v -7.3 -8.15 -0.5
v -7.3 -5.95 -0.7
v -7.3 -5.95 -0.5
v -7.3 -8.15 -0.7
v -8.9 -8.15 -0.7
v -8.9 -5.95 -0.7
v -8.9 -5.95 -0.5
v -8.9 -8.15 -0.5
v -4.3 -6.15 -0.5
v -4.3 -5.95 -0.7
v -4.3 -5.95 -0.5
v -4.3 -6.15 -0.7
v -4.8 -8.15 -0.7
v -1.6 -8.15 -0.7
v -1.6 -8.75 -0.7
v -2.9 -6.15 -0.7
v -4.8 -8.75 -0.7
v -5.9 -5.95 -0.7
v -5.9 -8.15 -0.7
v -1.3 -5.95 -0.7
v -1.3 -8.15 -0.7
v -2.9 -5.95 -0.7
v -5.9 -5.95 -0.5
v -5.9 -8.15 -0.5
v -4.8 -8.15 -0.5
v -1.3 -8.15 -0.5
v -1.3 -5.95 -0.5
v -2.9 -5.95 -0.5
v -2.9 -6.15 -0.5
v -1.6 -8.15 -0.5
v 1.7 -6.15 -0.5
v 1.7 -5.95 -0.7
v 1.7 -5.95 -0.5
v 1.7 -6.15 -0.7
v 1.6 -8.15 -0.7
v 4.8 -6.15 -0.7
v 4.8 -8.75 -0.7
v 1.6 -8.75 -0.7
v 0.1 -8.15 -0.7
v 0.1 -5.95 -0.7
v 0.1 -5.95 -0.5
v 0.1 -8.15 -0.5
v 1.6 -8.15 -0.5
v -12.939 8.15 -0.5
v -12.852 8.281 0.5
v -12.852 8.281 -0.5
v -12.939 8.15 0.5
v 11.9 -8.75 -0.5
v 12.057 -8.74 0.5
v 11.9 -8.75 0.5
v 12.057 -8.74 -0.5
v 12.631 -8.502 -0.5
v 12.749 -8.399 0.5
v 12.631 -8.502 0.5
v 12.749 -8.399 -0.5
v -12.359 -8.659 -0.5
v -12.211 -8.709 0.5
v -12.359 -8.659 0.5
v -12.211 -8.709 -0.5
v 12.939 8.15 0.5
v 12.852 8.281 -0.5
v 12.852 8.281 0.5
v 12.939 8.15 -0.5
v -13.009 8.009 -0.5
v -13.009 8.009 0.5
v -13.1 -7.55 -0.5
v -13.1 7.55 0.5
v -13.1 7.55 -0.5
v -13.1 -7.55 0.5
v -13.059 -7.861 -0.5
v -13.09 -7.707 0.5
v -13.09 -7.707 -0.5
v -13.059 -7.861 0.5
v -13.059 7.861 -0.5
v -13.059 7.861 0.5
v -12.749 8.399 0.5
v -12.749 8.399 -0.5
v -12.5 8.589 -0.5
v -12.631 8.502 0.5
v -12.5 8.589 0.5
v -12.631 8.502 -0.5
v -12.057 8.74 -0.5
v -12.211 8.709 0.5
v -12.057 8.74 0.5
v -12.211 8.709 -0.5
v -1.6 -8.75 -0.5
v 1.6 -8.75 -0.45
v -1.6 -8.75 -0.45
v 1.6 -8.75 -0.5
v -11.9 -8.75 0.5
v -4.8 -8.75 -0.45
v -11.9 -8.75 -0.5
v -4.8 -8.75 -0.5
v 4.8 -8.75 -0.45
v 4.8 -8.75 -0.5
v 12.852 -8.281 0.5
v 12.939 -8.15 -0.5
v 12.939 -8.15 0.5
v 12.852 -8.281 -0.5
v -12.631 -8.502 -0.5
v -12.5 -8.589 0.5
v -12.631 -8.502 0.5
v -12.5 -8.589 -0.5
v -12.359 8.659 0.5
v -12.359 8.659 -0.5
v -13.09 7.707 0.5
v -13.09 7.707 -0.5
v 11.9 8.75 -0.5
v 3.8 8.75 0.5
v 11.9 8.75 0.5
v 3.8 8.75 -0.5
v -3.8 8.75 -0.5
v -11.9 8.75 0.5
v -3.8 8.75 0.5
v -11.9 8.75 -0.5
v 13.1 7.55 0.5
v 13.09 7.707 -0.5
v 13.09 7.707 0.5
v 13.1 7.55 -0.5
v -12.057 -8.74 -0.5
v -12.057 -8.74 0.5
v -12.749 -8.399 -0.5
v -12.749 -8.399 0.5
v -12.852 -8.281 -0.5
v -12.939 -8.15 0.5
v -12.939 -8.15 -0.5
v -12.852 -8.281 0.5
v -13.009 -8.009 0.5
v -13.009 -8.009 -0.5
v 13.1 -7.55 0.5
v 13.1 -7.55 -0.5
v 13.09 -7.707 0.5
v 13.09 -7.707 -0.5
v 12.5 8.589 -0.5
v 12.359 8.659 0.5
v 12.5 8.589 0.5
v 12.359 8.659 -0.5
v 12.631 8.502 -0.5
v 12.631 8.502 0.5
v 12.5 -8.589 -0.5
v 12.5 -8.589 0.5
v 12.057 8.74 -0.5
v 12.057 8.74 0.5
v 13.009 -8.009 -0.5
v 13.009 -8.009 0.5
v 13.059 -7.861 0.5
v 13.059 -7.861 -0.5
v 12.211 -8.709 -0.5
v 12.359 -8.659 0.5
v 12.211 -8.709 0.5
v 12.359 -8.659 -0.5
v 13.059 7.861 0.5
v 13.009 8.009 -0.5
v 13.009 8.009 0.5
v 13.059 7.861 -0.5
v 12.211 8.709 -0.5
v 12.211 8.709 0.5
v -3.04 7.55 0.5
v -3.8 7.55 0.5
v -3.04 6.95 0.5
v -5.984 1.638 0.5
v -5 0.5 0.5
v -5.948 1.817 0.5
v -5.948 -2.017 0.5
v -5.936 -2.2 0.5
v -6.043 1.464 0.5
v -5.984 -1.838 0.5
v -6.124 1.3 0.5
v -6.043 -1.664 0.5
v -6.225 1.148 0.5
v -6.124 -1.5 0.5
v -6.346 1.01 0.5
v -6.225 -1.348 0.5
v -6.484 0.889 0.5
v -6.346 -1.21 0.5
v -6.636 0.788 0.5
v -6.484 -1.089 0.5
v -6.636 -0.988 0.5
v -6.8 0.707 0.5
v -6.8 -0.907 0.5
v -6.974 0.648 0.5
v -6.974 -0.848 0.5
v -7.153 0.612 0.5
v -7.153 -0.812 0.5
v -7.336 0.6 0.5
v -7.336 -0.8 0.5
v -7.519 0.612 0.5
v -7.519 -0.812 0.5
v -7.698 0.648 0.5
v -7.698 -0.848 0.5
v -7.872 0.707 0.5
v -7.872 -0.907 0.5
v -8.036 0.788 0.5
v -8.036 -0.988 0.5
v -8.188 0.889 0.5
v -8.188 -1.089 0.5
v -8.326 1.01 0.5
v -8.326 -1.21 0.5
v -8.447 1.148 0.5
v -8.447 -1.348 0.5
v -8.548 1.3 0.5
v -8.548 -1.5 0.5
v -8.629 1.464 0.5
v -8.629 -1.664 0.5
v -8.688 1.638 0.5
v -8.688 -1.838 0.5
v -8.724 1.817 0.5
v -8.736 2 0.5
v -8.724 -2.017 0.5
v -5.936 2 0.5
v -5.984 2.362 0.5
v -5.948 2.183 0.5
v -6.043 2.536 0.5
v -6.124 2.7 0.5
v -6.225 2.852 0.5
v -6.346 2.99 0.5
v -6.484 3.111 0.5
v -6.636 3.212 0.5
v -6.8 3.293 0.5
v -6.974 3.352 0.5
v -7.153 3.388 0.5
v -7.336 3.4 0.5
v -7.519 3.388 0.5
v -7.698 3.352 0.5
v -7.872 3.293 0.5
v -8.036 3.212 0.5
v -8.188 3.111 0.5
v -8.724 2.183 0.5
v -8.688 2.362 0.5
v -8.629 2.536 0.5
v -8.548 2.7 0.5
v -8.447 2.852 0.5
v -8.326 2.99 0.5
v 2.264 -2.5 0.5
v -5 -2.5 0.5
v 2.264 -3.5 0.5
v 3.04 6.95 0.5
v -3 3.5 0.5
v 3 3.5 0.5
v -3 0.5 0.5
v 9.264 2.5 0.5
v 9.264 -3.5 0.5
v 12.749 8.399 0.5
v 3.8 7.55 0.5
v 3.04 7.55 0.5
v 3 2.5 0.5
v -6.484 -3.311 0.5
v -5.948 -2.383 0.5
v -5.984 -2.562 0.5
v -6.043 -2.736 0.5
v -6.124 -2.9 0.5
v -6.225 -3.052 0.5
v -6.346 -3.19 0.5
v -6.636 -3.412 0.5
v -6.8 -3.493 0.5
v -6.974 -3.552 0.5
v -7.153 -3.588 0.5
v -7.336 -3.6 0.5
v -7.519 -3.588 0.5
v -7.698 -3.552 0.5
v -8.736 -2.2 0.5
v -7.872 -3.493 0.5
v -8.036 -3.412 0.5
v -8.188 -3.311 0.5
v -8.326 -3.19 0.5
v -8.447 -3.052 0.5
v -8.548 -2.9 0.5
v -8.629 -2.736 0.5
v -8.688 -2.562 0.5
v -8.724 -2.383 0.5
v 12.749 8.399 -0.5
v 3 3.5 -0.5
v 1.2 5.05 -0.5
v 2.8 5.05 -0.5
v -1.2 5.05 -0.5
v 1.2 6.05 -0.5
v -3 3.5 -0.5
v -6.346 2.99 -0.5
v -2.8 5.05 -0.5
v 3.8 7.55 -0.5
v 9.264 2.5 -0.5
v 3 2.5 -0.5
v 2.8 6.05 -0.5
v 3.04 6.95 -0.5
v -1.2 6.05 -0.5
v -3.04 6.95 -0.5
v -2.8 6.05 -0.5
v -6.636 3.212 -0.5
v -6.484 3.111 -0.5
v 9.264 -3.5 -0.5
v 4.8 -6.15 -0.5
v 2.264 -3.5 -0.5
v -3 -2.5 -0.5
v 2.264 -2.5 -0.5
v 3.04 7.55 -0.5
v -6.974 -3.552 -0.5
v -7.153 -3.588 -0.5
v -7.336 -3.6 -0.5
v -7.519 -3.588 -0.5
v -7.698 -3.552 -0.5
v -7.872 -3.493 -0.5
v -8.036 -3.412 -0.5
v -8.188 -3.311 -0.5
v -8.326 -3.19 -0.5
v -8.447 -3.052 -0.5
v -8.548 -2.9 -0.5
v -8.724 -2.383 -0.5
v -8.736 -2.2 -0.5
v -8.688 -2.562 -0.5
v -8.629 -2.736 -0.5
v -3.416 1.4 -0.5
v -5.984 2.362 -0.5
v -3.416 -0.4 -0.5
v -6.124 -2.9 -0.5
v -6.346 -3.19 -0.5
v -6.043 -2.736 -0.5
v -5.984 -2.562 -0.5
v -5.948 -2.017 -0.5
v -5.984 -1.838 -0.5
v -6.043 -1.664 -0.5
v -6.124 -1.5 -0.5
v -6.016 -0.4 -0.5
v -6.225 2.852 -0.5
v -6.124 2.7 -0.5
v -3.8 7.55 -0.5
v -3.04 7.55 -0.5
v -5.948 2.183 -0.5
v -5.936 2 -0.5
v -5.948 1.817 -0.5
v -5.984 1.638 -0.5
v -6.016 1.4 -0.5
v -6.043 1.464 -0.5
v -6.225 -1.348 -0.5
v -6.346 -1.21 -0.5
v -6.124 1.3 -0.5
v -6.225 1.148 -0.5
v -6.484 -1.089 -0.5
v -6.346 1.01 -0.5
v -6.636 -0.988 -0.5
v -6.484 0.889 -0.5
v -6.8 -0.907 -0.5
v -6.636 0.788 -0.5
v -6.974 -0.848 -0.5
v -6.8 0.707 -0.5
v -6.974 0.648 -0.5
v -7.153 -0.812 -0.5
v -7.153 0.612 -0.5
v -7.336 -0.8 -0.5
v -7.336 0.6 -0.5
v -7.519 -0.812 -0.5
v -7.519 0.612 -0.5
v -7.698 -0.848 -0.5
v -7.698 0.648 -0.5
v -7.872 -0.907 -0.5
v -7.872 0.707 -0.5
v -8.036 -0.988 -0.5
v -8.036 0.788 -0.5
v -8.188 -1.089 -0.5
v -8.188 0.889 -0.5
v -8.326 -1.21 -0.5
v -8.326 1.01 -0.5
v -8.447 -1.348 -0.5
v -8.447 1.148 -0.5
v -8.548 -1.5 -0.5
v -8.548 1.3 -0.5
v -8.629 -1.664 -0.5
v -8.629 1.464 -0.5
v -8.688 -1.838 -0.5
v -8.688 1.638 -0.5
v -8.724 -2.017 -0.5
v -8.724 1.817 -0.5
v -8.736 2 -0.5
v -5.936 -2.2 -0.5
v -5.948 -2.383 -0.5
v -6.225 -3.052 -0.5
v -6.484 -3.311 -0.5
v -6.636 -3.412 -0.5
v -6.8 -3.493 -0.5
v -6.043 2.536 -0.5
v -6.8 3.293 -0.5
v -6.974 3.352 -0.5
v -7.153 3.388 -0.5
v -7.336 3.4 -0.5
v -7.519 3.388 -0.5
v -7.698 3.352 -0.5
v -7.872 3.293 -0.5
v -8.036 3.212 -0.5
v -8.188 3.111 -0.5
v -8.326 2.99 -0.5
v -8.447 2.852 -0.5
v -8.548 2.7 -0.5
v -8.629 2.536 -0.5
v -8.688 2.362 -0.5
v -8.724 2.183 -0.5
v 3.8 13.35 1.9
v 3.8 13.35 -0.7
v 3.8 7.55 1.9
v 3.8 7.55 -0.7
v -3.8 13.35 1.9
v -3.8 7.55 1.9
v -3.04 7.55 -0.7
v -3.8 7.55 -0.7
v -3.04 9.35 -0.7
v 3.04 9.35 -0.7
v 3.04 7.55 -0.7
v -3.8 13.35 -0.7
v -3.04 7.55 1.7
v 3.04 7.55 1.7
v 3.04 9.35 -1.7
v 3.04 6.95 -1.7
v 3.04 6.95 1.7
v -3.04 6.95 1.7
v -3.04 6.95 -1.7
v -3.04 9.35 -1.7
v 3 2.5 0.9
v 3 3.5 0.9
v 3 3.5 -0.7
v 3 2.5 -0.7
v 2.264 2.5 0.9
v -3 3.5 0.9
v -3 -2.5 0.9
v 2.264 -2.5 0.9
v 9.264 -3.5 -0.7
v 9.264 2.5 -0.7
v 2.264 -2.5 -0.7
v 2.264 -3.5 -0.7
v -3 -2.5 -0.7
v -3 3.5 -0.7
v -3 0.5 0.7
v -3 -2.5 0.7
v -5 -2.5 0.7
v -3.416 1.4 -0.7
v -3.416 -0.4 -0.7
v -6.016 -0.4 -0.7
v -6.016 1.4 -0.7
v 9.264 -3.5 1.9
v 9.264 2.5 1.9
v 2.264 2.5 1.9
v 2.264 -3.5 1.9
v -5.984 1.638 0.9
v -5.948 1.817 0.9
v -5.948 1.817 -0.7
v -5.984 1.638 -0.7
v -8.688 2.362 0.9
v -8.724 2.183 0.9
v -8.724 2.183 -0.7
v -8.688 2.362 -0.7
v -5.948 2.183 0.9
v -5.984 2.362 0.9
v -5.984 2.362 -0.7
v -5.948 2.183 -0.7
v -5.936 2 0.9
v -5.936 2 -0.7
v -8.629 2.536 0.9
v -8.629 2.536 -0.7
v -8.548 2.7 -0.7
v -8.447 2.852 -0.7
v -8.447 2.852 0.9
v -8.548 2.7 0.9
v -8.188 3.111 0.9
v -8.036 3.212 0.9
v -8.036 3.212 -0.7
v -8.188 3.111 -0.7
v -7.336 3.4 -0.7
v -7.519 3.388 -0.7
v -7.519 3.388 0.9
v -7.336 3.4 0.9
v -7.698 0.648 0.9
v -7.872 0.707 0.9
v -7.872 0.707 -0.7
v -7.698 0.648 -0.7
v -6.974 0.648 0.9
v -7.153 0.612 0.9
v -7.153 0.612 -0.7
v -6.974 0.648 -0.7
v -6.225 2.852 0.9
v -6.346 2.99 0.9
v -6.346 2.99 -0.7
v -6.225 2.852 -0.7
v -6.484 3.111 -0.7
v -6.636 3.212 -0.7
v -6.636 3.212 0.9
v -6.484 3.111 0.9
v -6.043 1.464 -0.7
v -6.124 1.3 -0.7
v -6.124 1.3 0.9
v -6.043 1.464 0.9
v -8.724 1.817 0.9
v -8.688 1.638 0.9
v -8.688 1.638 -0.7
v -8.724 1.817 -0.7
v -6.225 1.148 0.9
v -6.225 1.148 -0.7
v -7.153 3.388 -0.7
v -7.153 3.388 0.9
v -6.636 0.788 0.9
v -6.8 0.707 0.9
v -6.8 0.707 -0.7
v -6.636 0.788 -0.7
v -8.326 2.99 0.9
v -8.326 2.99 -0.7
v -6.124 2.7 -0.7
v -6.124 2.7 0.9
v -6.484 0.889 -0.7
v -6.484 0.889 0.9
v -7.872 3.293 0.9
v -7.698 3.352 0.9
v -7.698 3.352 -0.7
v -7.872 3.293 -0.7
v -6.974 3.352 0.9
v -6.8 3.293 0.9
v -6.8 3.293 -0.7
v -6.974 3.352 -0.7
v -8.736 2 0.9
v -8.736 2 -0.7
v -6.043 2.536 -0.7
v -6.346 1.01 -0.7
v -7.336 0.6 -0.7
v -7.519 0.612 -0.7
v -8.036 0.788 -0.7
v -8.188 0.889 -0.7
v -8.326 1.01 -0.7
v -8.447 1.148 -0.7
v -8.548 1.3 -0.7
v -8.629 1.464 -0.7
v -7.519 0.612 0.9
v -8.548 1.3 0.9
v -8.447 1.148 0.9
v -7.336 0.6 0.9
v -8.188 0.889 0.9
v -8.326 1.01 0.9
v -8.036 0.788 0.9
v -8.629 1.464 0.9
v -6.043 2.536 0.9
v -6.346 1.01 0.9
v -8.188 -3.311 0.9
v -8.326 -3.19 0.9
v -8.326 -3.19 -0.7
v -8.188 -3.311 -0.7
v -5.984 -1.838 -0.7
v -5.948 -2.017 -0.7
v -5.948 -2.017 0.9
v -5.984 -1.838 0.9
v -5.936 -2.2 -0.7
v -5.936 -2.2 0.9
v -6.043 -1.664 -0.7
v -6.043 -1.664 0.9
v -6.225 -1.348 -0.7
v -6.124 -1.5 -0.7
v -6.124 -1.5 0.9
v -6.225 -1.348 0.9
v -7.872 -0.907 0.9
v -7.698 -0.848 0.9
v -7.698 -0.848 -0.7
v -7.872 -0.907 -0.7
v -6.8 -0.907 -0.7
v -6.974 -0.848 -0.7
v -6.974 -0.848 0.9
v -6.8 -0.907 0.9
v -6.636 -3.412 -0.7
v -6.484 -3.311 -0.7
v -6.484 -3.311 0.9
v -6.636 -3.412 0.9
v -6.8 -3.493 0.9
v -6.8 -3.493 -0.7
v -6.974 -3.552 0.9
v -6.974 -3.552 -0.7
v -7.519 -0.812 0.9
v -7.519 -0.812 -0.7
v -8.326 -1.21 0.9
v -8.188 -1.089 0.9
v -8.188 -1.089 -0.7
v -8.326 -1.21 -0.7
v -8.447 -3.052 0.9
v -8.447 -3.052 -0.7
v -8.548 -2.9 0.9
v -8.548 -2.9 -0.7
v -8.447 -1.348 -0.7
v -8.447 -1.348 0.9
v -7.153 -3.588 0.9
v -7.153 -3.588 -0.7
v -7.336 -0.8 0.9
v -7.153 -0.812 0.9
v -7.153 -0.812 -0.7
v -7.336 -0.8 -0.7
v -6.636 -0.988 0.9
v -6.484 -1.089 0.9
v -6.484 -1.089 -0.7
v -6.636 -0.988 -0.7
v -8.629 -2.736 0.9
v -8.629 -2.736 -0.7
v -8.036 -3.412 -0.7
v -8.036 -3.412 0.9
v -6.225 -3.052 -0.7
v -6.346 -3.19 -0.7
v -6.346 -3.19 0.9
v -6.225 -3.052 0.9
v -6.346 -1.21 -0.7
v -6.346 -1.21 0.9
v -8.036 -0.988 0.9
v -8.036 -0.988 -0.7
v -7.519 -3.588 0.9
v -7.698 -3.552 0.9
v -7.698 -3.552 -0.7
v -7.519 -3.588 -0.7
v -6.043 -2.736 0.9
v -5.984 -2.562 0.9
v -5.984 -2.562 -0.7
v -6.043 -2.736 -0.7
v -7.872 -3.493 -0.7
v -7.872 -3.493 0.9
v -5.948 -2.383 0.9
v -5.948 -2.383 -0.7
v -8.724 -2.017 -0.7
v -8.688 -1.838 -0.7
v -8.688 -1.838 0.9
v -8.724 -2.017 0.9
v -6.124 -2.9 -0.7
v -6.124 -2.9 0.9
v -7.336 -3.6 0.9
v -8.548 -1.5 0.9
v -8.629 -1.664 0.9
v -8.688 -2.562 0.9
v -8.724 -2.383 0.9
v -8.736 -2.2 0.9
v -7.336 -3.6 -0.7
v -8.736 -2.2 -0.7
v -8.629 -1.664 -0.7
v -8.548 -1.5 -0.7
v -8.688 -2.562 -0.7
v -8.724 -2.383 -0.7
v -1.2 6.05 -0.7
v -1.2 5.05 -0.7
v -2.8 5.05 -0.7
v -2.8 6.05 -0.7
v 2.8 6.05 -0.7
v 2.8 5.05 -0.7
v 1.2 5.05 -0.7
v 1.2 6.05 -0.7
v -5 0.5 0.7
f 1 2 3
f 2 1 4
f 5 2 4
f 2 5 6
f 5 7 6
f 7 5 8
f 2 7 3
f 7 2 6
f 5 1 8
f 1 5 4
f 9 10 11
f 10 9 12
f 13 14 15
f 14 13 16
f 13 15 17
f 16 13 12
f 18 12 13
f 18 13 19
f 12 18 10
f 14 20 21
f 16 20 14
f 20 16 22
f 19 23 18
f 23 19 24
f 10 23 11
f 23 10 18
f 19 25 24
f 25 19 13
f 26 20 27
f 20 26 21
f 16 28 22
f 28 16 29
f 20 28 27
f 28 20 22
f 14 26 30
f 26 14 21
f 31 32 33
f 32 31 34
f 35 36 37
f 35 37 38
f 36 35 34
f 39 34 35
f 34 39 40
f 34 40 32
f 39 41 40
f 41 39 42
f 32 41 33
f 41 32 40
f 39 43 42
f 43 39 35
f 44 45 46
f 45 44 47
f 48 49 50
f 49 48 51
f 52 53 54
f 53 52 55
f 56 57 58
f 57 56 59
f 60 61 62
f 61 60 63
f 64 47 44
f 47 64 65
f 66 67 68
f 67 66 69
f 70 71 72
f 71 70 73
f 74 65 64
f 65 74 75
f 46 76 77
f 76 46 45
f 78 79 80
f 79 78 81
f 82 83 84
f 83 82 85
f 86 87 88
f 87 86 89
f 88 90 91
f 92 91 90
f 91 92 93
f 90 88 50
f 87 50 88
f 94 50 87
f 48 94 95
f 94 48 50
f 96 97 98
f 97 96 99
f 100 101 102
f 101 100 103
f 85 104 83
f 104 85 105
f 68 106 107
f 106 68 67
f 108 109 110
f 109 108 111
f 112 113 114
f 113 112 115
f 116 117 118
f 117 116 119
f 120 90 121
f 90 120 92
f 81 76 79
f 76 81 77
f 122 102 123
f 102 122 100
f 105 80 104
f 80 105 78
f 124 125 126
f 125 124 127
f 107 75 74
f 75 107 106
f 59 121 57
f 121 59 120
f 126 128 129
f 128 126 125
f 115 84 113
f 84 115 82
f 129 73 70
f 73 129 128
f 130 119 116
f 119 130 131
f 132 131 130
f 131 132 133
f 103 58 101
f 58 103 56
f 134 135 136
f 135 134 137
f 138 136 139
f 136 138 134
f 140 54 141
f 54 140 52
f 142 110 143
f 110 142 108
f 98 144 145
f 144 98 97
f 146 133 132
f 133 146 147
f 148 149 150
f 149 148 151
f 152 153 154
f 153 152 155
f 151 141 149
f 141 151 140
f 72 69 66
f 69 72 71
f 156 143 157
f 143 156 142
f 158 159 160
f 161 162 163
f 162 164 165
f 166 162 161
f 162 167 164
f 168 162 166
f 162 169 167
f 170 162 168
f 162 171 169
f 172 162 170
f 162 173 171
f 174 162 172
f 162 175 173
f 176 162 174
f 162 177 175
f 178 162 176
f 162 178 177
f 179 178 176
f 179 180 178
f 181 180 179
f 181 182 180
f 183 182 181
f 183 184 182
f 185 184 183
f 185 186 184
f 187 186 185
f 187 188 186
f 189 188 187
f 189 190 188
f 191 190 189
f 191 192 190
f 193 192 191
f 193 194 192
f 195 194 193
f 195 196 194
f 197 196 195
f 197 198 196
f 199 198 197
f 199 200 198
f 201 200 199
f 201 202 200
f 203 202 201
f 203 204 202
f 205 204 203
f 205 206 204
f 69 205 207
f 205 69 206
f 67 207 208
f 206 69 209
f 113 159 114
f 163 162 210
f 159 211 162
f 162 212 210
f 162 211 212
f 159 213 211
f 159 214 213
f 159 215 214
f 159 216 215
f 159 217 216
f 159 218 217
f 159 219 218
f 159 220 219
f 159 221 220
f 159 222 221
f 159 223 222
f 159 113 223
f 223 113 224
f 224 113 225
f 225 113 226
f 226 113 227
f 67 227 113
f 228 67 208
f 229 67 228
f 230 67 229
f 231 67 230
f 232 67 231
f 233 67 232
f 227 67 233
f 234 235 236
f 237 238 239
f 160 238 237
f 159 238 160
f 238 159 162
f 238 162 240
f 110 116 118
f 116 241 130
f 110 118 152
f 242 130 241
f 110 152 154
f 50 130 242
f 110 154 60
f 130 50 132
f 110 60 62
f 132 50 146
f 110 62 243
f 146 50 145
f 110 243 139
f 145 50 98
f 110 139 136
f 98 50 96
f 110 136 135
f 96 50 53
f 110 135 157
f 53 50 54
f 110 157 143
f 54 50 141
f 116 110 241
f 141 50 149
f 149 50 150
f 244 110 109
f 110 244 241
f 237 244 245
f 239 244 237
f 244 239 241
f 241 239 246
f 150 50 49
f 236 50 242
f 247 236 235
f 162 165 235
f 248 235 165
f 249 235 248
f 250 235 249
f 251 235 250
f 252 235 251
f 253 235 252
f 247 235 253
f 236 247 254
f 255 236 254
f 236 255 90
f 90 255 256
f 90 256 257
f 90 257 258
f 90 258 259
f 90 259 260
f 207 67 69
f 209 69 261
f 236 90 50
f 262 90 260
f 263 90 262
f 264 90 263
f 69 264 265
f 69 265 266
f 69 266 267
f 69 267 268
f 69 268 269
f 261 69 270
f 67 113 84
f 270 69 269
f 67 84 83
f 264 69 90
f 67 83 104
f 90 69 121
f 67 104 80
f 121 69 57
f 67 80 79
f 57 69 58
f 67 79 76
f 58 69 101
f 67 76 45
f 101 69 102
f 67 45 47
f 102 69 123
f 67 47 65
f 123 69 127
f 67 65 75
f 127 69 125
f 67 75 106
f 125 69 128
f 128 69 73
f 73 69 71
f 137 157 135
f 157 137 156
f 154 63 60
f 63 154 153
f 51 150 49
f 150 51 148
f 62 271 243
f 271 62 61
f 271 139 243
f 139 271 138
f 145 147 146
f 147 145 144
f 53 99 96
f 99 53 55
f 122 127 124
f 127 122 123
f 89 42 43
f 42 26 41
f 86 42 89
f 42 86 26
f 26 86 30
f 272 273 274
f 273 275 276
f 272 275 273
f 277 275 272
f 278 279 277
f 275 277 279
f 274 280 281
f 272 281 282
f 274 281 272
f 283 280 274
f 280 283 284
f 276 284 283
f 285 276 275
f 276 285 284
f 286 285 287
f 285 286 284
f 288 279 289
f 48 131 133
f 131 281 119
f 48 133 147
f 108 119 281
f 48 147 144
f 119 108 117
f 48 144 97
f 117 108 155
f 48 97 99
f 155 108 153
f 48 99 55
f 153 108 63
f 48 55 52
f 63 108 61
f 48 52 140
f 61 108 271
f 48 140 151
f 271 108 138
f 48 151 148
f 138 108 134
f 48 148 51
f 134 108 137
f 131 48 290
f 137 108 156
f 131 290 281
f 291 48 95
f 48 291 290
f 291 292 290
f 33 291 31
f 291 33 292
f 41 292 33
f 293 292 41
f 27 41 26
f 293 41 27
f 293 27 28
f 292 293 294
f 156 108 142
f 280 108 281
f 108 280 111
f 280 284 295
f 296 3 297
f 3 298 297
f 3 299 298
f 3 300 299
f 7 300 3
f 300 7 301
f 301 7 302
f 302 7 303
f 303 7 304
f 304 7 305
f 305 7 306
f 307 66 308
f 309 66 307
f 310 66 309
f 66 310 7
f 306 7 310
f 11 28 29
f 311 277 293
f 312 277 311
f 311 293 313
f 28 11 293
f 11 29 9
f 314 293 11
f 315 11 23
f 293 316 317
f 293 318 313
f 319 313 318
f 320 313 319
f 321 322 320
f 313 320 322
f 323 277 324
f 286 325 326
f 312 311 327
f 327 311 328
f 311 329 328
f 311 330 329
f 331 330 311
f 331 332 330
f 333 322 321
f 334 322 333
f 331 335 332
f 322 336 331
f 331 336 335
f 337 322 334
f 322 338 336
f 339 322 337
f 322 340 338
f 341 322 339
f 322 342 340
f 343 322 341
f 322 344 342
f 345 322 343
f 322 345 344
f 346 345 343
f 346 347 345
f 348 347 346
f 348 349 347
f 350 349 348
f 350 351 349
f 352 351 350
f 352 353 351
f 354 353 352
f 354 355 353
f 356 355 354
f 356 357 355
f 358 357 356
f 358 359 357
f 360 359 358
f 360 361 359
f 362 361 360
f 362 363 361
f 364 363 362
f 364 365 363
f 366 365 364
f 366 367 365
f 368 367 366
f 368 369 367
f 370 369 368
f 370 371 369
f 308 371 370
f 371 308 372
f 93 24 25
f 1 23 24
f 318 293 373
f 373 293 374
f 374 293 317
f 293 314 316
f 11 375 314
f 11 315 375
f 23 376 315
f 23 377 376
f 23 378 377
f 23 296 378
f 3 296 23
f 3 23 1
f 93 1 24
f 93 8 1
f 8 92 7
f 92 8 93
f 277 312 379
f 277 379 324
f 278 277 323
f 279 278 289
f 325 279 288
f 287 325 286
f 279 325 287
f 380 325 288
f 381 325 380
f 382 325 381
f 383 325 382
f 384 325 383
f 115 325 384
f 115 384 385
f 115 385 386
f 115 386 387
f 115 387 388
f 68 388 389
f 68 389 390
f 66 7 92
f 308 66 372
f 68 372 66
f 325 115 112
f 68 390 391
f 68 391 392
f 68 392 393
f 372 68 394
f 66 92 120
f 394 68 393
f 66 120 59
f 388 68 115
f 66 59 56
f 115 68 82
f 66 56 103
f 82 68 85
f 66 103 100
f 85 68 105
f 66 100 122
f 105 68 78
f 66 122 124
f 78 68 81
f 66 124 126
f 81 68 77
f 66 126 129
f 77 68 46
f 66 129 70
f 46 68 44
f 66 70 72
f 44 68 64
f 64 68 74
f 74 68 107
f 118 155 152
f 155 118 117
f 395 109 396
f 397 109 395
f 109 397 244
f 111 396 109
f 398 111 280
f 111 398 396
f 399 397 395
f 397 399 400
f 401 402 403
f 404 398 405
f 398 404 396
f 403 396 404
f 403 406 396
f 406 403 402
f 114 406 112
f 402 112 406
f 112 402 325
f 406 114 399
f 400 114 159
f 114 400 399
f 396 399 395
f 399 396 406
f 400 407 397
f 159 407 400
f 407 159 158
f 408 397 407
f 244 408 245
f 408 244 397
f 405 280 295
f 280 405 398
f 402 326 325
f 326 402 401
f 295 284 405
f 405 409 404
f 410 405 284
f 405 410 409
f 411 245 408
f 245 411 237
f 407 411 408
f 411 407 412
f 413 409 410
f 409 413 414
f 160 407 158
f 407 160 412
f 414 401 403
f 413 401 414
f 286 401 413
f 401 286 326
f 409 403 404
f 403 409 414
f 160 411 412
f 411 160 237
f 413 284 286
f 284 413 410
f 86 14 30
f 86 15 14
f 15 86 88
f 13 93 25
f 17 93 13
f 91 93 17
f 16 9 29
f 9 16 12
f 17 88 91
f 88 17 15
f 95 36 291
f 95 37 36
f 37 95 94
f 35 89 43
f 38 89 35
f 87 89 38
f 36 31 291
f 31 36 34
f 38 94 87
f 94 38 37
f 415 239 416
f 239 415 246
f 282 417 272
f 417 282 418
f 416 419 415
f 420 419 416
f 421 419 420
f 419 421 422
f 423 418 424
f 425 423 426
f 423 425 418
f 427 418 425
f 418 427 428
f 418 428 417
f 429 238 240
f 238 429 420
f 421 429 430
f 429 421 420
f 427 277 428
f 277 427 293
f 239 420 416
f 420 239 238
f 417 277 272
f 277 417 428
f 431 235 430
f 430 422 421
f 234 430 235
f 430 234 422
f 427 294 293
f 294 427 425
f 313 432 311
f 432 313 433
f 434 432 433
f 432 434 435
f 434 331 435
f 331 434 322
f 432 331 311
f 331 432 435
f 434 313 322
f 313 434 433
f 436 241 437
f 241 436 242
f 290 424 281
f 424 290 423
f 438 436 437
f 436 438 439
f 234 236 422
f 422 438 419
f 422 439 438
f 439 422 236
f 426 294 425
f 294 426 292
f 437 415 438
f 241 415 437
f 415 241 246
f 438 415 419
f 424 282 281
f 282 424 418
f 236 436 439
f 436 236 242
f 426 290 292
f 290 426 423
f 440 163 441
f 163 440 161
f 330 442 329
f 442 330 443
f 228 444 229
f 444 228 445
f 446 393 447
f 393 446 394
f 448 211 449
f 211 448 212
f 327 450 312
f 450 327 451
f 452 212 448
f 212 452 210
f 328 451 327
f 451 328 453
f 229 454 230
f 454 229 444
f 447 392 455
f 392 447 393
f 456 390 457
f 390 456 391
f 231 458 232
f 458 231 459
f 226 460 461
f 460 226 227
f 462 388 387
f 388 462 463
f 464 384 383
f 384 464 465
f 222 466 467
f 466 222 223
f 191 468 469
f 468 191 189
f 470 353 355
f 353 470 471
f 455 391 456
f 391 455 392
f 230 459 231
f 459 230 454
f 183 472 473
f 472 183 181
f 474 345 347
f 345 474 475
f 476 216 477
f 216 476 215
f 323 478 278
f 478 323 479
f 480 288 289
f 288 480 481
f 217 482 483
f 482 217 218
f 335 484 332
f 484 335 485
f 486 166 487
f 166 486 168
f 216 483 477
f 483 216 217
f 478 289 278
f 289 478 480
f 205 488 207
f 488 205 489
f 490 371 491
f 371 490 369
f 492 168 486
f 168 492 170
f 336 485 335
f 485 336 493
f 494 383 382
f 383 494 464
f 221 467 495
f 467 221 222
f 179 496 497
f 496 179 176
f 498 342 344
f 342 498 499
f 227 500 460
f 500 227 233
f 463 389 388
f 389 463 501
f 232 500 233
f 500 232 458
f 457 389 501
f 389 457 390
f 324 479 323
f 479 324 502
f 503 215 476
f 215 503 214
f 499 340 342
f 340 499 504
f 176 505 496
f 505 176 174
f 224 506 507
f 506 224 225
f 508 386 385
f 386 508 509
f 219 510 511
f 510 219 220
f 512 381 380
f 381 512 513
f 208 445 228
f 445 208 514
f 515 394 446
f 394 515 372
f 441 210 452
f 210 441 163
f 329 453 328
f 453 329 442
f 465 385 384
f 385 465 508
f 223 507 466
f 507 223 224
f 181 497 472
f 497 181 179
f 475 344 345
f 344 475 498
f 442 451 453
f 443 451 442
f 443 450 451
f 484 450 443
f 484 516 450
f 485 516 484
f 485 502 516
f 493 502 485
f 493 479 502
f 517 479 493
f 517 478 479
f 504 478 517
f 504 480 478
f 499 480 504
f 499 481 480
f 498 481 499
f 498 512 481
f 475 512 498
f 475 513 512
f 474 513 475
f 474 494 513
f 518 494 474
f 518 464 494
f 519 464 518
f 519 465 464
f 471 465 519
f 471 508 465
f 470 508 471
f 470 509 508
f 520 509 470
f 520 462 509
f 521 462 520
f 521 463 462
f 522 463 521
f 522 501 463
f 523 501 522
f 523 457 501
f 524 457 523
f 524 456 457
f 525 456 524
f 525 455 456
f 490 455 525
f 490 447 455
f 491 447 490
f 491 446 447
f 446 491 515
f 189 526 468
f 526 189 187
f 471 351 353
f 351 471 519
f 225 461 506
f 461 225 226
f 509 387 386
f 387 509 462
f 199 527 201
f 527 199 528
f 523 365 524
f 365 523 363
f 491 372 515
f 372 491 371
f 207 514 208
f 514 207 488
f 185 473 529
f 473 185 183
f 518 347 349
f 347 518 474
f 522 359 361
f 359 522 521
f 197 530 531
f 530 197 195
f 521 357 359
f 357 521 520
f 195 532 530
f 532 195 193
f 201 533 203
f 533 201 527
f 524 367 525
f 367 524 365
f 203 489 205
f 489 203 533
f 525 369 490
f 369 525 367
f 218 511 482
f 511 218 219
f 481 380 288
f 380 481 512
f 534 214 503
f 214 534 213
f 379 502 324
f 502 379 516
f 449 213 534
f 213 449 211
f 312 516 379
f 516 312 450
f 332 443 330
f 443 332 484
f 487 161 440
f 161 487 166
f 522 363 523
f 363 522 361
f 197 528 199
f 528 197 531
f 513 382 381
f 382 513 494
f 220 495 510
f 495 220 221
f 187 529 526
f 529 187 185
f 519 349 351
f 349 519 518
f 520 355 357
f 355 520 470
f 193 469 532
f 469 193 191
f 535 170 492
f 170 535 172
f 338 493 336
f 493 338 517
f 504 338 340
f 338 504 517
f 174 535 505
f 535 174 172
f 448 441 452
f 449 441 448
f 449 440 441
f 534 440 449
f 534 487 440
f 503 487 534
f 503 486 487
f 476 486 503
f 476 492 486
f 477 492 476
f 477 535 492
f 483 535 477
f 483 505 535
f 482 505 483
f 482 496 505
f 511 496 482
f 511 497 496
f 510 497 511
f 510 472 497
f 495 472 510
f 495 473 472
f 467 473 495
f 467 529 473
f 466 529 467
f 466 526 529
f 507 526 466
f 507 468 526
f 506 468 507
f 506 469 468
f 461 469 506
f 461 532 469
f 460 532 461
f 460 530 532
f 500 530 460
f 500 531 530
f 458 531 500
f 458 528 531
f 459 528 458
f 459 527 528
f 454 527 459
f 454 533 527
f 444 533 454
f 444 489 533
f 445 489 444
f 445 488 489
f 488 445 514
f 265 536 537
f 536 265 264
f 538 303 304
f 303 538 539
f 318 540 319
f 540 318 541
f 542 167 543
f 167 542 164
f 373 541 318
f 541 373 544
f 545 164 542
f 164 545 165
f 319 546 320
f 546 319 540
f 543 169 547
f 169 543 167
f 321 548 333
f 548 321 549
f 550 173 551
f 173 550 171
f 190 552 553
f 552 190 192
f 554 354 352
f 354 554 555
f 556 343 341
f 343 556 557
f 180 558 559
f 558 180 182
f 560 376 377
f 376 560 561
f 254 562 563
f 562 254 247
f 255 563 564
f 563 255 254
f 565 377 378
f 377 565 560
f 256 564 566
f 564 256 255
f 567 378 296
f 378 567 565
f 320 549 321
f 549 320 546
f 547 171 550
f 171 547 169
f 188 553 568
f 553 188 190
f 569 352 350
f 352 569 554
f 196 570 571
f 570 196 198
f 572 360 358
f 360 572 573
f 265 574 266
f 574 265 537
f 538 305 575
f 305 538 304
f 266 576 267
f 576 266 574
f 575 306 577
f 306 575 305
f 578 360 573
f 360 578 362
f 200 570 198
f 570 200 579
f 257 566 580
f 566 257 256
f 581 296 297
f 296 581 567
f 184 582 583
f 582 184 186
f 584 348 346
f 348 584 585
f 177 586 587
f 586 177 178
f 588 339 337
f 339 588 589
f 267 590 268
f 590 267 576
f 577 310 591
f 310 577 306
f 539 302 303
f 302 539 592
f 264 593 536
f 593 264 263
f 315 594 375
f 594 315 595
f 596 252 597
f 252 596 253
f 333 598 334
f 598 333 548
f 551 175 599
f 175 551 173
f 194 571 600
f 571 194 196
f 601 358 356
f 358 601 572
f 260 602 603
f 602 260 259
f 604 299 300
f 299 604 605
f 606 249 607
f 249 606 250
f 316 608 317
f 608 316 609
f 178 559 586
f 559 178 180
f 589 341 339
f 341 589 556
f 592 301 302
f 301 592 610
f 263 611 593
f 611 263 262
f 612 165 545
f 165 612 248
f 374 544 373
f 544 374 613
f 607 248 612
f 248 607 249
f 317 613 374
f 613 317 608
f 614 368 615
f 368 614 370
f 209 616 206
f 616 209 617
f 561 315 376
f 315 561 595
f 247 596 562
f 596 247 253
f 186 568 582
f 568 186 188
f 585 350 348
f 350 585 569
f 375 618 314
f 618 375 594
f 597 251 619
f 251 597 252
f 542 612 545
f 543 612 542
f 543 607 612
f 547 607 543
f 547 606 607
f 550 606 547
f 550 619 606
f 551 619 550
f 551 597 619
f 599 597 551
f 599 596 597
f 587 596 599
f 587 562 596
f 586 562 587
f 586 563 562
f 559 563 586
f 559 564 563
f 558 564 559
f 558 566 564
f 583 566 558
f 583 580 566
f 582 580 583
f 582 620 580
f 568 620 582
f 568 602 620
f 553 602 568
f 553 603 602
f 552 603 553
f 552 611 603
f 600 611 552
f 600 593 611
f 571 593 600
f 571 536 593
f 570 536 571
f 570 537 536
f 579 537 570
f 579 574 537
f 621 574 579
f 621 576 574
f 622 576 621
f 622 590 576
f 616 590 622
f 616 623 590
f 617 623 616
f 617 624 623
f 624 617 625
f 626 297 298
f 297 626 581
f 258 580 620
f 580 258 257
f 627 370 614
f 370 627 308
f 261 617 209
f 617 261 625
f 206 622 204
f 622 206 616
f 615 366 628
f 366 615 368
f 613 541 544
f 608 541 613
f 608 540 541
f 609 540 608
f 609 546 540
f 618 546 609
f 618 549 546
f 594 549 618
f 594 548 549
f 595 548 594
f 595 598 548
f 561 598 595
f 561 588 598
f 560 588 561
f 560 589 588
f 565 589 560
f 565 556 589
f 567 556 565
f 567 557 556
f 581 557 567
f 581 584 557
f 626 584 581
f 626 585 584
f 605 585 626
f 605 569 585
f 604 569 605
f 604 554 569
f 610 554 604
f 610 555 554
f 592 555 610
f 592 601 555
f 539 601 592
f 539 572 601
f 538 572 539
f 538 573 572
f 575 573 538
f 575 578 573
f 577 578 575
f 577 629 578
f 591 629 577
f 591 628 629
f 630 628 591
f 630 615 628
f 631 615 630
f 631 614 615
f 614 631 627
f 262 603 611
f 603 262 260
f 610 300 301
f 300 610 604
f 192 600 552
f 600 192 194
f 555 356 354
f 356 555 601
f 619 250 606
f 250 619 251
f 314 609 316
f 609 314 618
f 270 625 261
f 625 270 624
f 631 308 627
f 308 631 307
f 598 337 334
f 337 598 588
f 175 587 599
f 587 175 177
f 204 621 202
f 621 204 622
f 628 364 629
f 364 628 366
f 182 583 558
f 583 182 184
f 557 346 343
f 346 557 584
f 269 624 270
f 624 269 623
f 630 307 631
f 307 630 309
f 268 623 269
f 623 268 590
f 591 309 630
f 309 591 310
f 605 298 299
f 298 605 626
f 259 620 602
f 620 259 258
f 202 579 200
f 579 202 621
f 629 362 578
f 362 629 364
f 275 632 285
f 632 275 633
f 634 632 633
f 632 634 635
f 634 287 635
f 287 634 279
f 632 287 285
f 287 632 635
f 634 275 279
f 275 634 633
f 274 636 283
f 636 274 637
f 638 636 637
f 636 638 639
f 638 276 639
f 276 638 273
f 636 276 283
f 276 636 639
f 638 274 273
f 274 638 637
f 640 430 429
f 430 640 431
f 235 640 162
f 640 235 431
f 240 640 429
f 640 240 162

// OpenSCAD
// Battery charger module (PCB + components) — one connected solid
// Overall PCB: 26.2mm x 17.5mm x 1.0mm

$fn = 48;

// Board dimensions
length_mm    = 26.2;
width_mm     = 17.5;
thickness_mm = 1.0;

// Structural overlap to guarantee watertight unions (1–2mm as required)
overlap = 1.2;

// Helper: rounded rectangle prism
module rounded_rect_prism(l, w, h, r, center=false) {
    r2 = min(r, min(l, w)/2);
    translate(center ? [0,0,0] : [l/2, w/2, h/2])
        linear_extrude(height=h, center=true)
            offset(r=r2)
                square([l-2*r2, w-2*r2], center=true);
}

// Main model
module charger_module() {
    // PCB
    pcb_r = 1.2;
    pcb_h = thickness_mm;

    // Component heights (above PCB top)
    comp_h_low  = 0.8;
    comp_h_mid  = 1.6;
    comp_h_tall = 2.6;

    // Z references (PCB centered at Z=0)
    pcb_zc      = 0;
    pcb_top_z   = pcb_zc + pcb_h/2;
    pcb_bot_z   = pcb_zc - pcb_h/2;

    union() {
        // PCB body
        color([0.0, 0.45, 0.25])
            rounded_rect_prism(length_mm, width_mm, pcb_h, pcb_r, center=true);

        // --- USB connector: ensure it is physically attached (overlap into PCB) ---
        usb_w = 7.6;
        usb_l = 5.8;   // protrudes outward from board edge (Y+)
        usb_h = 2.6;

        // Inner face must penetrate PCB by 'overlap'
        // inner face y = usb_y - usb_l/2 = width/2 - overlap
        usb_y = width_mm/2 + usb_l/2 - overlap;

        // Bottom must penetrate PCB top by 'overlap'
        // bottom z = usb_z - usb_h/2 = pcb_top_z - overlap
        usb_z = pcb_top_z + usb_h/2 - overlap;

        translate([0, usb_y, usb_z])
            color([0.75, 0.75, 0.78])
                cube([usb_w, usb_l, usb_h], center=true);

        // Small "tongue" under connector (also overlaps into PCB)
        tongue_w = 5.6;
        tongue_l = 2.2;
        tongue_h = 0.8;

        tongue_y = width_mm/2 + tongue_l/2 - overlap;
        tongue_z = pcb_top_z + tongue_h/2 - overlap;

        translate([0, tongue_y, tongue_z])
            color([0.65, 0.65, 0.68])
                cube([tongue_w, tongue_l, tongue_h], center=true);

        // Robust bridge/anchor that straddles PCB edge and intersects USB body
        // (guarantees no visible gap in side views)
        anchor_w = usb_w * 0.80;
        anchor_l = overlap * 2.0;          // straddles the PCB edge in Y
        anchor_h = pcb_h + overlap * 2.0;  // spans through PCB thickness a bit
        anchor_y = width_mm/2 - overlap/2; // centered on PCB edge
        anchor_z = 0;

        translate([0, anchor_y, anchor_z])
            color([0.70, 0.70, 0.72])
                cube([anchor_w, anchor_l, anchor_h], center=true);

        // Battery pads at opposite short edge (two pads) - overlap into PCB
        pad_w = 3.2;
        pad_l = 2.6;
        pad_h = 0.25;

        pad_y = -width_mm/2 + pad_l/2;
        pad_z = pcb_top_z + pad_h/2 - overlap;

        translate([-3.2, pad_y, pad_z])
            color([0.85, 0.7, 0.2])
                cube([pad_w, pad_l, pad_h], center=true);

        translate([ 3.2, pad_y, pad_z])
            color([0.85, 0.7, 0.2])
                cube([pad_w, pad_l, pad_h], center=true);

        // Main charger IC (center-ish) - overlap into PCB
        ic_l = 6.0;
        ic_w = 6.0;
        ic_h = comp_h_mid;

        translate([0, 0.5, pcb_top_z + ic_h/2 - overlap])
            color([0.12, 0.12, 0.12])
                cube([ic_l, ic_w, ic_h], center=true);

        // --- Small light-gray rectangular component near center: FIXED (no hovering) ---
        // Ensure bottom penetrates PCB top by 'overlap' (same rule as other top components)
        smd_l = 2.6;
        smd_w = 1.8;
        smd_h = 0.9;

        // Place it near the IC (left side), matching the visual intent
        smd_x = -length_mm*0.18;
        smd_y = 0.5;

        // bottom z = pcb_top_z - overlap  => z = pcb_top_z + smd_h/2 - overlap
        smd_z = pcb_top_z + smd_h/2 - overlap;

        translate([smd_x, smd_y, smd_z])
            color([0.78, 0.78, 0.78])
                cube([smd_l, smd_w, smd_h], center=true);

        // Inductor / large component (taller block) - overlap into PCB
        ind_l = 7.0;
        ind_w = 6.0;
        ind_h = comp_h_tall;

        translate([length_mm*0.22, -0.5, pcb_top_z + ind_h/2 - overlap])
            color([0.2, 0.2, 0.2])
                cube([ind_l, ind_w, ind_h], center=true);

        // Two capacitors (small cylinders) - overlap into PCB
        cap_r = 1.4;
        cap_h = comp_h_mid;

        translate([-length_mm*0.28,  2.0, pcb_top_z + cap_h/2 - overlap])
            color([0.18, 0.18, 0.18])
                cylinder(r=cap_r, h=cap_h, center=true);

        translate([-length_mm*0.28, -2.2, pcb_top_z + cap_h/2 - overlap])
            color([0.18, 0.18, 0.18])
                cylinder(r=cap_r, h=cap_h, center=true);

        // Status LEDs (two tiny blocks near USB edge) - overlap into PCB
        led_l = 1.6;
        led_w = 1.0;
        led_h = comp_h_low;

        led_y = width_mm/2 - 3.2;
        translate([-2.0, led_y, pcb_top_z + led_h/2 - overlap])
            color([0.9, 0.1, 0.1])
                cube([led_l, led_w, led_h], center=true);

        translate([ 2.0, led_y, pcb_top_z + led_h/2 - overlap])
            color([0.1, 0.8, 0.1])
                cube([led_l, led_w, led_h], center=true);

        // Bottom-side solder blobs/pads (kept connected by overlap into PCB)
        bot_pad_l = 10.0;
        bot_pad_w = 3.0;
        bot_pad_h = 0.25;

        // top of bottom pad penetrates PCB bottom by 'overlap'
        // top z = z_center + bot_pad_h/2 = pcb_bot_z + overlap
        translate([0, -1.0, pcb_bot_z - bot_pad_h/2 + overlap])
            color([0.75, 0.75, 0.75])
                cube([bot_pad_l, bot_pad_w, bot_pad_h], center=true);

        // Side header pads (4 pads) along one long edge - overlap into PCB
        hp_w = 1.6;
        hp_l = 2.2;
        hp_h = 0.25;

        hp_x0 = -length_mm/2 + 5.0;
        hp_dx = 3.0;
        hp_y  = -width_mm/2 + hp_l/2 + 0.6;
        hp_z  = pcb_top_z + hp_h/2 - overlap;

        for (i = [0:3]) {
            translate([hp_x0 + i*hp_dx, hp_y, hp_z])
                color([0.85, 0.7, 0.2])
                    cube([hp_w, hp_l, hp_h], center=true);
        }
    }
}

charger_module();
